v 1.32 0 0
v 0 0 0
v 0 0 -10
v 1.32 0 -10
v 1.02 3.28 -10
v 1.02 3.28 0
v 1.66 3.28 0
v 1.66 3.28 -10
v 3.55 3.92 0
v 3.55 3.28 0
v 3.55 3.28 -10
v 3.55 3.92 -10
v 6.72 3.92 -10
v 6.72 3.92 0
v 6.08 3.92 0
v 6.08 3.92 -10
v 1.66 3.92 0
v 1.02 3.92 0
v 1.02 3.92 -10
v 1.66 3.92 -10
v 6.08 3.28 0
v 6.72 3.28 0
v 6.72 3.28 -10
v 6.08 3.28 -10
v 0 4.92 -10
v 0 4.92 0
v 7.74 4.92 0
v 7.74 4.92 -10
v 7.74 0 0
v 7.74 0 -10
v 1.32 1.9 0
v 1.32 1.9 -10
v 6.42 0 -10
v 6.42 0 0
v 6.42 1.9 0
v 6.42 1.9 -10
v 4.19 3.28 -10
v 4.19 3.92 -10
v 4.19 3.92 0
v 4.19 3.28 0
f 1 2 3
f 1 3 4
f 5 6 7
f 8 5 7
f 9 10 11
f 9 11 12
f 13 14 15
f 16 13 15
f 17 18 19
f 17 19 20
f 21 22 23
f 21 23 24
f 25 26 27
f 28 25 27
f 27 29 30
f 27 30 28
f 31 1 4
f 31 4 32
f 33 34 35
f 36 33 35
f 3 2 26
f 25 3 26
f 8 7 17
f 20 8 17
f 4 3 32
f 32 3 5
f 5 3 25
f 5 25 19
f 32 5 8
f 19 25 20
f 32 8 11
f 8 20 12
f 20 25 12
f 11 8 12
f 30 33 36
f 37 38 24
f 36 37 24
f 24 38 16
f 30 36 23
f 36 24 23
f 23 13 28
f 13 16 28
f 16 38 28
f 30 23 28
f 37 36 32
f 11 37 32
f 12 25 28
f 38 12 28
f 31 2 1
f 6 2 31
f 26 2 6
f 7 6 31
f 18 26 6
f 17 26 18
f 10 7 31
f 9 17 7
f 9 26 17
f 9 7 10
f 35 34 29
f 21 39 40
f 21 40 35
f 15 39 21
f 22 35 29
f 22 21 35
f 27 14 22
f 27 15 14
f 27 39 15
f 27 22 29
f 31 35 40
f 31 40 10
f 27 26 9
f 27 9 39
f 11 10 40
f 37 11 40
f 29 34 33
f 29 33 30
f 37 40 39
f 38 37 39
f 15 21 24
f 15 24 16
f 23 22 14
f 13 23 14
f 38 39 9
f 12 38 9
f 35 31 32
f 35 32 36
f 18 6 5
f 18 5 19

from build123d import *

# Parameters (mm, degrees)
SKETCH1_W           = 7.74
SKETCH1_H           = 4.92
BOSS_EXTRUDE1_DEPTH = 10
SKETCH2_W           = 5.1
SKETCH2_H           = 1.9
CUT_EXTRUDE1_DEPTH  = 11
SKETCH3_W           = 0.32
SKETCH3_H           = 0.64
SKETCH3_W_2         = 0.64
CUT_EXTRUDE2_DEPTH  = 11


with BuildPart() as part:
    # Sketch1 → Boss-Extrude1 (new body)
    with BuildSketch(Plane.XY):
        with Locations((3.87, 2.46)):
            Rectangle(SKETCH1_W, SKETCH1_H)
    extrude(amount=-BOSS_EXTRUDE1_DEPTH)

    # Sketch2 → Cut-Extrude1 (cut, through all)
    with BuildSketch(Plane.XY):
        with Locations((3.87, 0.95)):
            Rectangle(SKETCH2_W, SKETCH2_H)
    extrude(amount=-CUT_EXTRUDE1_DEPTH, mode=Mode.SUBTRACT)

    # Sketch3 → Cut-Extrude2 (cut, through all)
    with BuildSketch(Plane.XY):
        with Locations((3.71, 3.6)):
            Rectangle(SKETCH3_W, SKETCH3_H)
        with Locations((1.34, 3.6)):
            Rectangle(SKETCH3_W_2, SKETCH3_H)
    cut_extrude2 = extrude(amount=-CUT_EXTRUDE2_DEPTH, mode=Mode.SUBTRACT)

    # Mirror1: Cut-Extrude2 across plane
    add(cut_extrude2.mirror(Plane.ZY.offset(-3.87)), mode=Mode.SUBTRACT)


solid = part.part
